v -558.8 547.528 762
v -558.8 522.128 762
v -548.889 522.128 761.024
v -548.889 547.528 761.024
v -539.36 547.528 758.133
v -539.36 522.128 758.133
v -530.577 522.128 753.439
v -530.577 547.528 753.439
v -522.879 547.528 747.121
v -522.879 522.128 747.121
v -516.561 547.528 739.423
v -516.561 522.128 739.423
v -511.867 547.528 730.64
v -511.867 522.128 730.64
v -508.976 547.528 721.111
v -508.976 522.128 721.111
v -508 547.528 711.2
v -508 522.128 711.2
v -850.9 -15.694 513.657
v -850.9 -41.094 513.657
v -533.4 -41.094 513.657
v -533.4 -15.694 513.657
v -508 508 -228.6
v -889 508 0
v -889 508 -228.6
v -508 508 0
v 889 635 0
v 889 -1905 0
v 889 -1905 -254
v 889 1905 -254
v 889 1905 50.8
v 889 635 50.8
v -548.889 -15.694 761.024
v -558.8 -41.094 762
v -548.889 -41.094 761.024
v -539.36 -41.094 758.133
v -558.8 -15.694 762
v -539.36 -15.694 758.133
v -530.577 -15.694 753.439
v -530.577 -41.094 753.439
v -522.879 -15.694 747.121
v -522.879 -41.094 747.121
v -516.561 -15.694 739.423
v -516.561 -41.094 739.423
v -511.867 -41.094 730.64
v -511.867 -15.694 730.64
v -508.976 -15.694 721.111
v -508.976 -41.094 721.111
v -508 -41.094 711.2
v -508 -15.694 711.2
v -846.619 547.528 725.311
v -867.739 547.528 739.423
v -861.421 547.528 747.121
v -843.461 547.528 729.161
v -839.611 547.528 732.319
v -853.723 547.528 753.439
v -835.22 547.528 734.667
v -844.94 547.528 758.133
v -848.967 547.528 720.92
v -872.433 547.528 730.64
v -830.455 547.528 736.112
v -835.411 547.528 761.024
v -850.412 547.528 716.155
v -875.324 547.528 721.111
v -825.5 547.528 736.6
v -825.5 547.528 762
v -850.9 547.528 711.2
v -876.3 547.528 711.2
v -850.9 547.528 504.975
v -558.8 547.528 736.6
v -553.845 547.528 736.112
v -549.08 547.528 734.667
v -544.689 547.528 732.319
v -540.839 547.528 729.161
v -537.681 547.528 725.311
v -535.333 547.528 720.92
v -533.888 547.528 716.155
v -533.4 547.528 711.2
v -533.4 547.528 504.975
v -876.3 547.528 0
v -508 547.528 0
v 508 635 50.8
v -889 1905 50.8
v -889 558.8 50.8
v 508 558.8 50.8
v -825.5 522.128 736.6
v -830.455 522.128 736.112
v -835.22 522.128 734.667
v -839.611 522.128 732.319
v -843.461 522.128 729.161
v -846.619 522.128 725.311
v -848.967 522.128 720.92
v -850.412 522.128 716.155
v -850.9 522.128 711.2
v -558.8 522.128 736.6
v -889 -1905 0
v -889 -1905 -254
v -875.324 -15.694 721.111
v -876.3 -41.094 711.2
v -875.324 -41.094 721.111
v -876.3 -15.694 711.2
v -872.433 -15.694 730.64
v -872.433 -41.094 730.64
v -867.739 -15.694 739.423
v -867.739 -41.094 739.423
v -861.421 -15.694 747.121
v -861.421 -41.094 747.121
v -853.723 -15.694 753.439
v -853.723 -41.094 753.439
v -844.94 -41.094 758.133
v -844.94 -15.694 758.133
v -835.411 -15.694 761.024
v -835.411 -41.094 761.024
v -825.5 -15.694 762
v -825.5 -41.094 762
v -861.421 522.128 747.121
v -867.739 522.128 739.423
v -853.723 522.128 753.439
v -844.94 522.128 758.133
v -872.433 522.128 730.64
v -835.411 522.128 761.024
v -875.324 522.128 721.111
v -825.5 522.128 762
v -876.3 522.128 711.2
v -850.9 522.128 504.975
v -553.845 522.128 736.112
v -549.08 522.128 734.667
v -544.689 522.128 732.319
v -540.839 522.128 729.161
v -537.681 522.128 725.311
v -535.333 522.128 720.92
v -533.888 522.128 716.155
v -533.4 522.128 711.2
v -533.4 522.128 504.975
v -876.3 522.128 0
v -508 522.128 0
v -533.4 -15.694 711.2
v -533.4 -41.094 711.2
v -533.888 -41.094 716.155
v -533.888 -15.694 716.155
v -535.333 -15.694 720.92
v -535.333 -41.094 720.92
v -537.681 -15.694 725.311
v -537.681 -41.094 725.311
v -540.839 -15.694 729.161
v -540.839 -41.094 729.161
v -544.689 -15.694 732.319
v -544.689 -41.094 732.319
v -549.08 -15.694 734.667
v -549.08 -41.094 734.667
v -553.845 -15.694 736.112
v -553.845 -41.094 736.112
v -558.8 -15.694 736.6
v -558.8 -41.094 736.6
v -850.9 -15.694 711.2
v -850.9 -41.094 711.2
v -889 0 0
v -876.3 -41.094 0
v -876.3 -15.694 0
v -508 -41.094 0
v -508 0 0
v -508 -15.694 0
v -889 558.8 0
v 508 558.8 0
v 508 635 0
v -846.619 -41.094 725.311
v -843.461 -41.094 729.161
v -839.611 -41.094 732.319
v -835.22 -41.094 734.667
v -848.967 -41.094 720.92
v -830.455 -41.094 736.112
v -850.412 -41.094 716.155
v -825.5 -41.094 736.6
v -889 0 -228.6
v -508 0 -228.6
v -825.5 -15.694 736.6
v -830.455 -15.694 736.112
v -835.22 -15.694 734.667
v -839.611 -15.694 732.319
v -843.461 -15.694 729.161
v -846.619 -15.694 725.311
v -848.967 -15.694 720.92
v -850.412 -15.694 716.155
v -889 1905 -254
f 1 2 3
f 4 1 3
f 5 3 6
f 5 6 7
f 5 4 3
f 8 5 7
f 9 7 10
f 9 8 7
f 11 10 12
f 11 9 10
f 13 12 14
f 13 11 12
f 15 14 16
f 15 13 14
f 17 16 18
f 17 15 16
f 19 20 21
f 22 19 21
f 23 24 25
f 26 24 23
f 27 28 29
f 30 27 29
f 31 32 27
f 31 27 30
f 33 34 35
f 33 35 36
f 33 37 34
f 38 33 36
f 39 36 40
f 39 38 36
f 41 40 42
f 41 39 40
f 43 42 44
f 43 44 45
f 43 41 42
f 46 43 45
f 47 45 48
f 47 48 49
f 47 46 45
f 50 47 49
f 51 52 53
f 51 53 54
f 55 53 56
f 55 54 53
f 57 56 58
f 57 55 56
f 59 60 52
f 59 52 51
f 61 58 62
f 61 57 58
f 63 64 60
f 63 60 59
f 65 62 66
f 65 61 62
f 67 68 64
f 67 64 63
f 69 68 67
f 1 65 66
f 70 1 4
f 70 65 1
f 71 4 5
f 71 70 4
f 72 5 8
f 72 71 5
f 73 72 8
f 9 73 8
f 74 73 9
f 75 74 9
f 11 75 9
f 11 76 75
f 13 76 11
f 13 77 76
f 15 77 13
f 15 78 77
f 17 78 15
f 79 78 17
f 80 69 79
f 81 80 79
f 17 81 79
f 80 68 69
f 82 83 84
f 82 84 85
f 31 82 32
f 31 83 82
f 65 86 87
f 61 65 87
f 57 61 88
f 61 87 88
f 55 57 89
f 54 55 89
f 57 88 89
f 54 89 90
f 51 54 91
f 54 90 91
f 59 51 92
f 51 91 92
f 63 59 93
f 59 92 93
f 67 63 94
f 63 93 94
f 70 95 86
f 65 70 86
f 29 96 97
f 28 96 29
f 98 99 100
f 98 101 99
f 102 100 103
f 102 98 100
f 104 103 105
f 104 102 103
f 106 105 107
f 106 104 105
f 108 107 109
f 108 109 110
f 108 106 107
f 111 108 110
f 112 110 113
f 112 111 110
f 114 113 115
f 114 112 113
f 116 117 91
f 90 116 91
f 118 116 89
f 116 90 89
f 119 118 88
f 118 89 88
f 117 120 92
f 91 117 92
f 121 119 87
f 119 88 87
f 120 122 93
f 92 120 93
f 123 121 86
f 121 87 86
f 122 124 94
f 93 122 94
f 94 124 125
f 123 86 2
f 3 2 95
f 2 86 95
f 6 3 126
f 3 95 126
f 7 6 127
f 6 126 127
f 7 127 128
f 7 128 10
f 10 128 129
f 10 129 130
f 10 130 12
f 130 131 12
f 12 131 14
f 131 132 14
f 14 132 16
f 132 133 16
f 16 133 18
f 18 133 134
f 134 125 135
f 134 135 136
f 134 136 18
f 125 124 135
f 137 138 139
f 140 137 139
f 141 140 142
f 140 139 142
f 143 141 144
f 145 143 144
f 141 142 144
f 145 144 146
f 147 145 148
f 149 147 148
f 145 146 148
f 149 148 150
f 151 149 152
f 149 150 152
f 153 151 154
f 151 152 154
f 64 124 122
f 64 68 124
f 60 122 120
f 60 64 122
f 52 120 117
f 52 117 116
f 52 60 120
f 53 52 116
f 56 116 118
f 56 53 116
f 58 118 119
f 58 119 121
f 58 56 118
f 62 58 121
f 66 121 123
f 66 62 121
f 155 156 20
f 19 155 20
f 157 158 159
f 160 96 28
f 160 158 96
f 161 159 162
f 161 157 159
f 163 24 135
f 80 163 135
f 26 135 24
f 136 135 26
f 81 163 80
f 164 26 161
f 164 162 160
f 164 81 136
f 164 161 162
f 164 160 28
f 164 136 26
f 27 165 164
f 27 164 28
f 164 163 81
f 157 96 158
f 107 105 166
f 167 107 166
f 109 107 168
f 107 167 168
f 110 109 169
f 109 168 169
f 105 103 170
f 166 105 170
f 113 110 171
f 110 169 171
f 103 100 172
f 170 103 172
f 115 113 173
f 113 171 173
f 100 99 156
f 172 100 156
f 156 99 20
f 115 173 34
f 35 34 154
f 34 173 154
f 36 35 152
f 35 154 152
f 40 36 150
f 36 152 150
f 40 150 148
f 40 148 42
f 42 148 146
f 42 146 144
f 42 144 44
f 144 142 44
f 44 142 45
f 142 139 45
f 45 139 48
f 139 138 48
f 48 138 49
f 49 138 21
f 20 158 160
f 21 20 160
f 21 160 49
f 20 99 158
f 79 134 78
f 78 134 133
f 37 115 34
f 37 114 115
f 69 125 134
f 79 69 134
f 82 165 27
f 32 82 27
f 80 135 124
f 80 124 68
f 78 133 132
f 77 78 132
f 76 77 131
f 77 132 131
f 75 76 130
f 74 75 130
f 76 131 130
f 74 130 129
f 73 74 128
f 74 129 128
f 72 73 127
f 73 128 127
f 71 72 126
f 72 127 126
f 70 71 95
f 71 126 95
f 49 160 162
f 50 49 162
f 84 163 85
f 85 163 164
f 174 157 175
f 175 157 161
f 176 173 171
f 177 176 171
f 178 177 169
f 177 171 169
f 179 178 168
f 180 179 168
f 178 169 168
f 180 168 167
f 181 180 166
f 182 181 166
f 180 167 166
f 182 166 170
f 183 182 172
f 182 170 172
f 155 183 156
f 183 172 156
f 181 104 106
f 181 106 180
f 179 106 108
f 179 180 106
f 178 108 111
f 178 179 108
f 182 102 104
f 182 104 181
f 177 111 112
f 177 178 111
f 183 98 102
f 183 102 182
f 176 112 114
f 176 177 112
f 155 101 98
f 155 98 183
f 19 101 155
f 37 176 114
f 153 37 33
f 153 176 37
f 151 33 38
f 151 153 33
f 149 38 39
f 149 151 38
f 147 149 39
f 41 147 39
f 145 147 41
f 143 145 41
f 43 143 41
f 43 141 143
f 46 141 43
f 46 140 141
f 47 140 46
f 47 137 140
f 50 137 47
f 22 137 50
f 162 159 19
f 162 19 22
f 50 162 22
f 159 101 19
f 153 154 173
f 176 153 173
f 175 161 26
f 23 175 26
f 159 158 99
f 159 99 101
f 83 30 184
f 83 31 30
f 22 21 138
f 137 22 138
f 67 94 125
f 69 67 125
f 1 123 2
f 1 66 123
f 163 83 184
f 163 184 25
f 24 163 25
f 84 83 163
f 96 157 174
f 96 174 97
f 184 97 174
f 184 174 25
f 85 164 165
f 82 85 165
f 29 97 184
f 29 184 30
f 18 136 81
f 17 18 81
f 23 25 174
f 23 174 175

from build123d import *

# Parameters (mm, degrees)
F1_DEPTH  = 50.8
F0_W      = 381
F0_H      = 609.6
F2_DEPTH  = 254
F3_W      = 381
F3_H      = 508
F4_DEPTH  = 228.6
F5_W      = 368.3
F5_H      = 25.4
F6_DEPTH  = 762
F7_R      = 50.8
F8_R      = 50.8
F10_DEPTH = 25.4
F11_W     = 368.3
F11_H     = 25.4
F12_DEPTH = 762
F13_R     = 50.8
F14_R     = 50.8
F16_DEPTH = 25.4


with BuildPart() as f1:
    # F0 (on Top) → F1 (new body)
    with BuildSketch(Plane.XY):
        Polygon((889, 1905), (-889, 1905), (-889, 558.8), (508, 558.8), (508, 635), (889, 635), align=None)
    extrude(amount=F1_DEPTH)

    # F0 (on Top) → F2 (join)
    with BuildSketch(Plane.XY):
        Polygon((889, 1905), (-889, 1905), (-889, 558.8), (508, 558.8), (508, 635), (889, 635), align=None)
        Polygon((508, 558.8), (-889, 558.8), (-889, 304.8), (-508, 304.8), (-508, -304.8), (-889, -304.8), (-889, -1905), (889, -1905), (889, 635), (508, 635), align=None)
        with Locations((-698.5, 0)):
            Rectangle(F0_W, F0_H)
    extrude(amount=-F2_DEPTH)

    # F3 (on face) → F4 (cut)
    with BuildSketch(Plane.XY):
        with Locations((-698.5, 254)):
            Rectangle(F3_W, F3_H)
    extrude(amount=-F4_DEPTH, mode=Mode.SUBTRACT)

    # F5 (on face) → F6 (join)
    with BuildSketch(Plane.XY):
        with Locations((-692.15, 534.827676)):
            Rectangle(F5_W, F5_H)
    extrude(amount=F6_DEPTH)

    # F7
    f7_edges = [f1.edges().sort_by_distance(p)[0] for p in [
        (-876.3, 534.827676, 762),
    ]]
    fillet(f7_edges, radius=F7_R)

    # F8
    f8_edges = [f1.edges().sort_by_distance(p)[0] for p in [
        (-508, 534.827676, 762),
    ]]
    fillet(f8_edges, radius=F8_R)

    # F9 (on face) → F10 (cut)
    with BuildSketch(Plane.XZ.offset(-522.127676)):
        with BuildLine():
            Line((-850.9, 711.2), (-850.9, 504.975423))
            Line((-850.9, 504.975423), (-533.4, 504.975423))
            Line((-533.4, 504.975423), (-533.4, 711.2))
            ThreePointArc((-533.4, 711.2), (-540.839488, 729.160512), (-558.8, 736.6))
            Line((-558.8, 736.6), (-825.5, 736.6))
            ThreePointArc((-825.5, 736.6), (-843.460512, 729.160512), (-850.9, 711.2))
        make_face()
    extrude(amount=-F10_DEPTH, mode=Mode.SUBTRACT)

    # F11 (on face) → F12 (join)
    with BuildSketch(Plane.XY):
        with Locations((-692.15, -28.393558)):
            Rectangle(F11_W, F11_H)
    extrude(amount=F12_DEPTH)

    # F13
    f13_edges = [f1.edges().sort_by_distance(p)[0] for p in [
        (-876.3, -28.393558, 762),
    ]]
    fillet(f13_edges, radius=F13_R)

    # F14
    f14_edges = [f1.edges().sort_by_distance(p)[0] for p in [
        (-508, -28.393558, 762),
    ]]
    fillet(f14_edges, radius=F14_R)

    # F15 (on face) → F16 (cut)
    with BuildSketch(Plane.XZ.offset(41.093558)):
        with BuildLine():
            Line((-850.9, 711.2), (-850.9, 513.656903))
            Line((-850.9, 513.656903), (-533.4, 513.656903))
            Line((-533.4, 513.656903), (-533.4, 711.2))
            ThreePointArc((-533.4, 711.2), (-540.839488, 729.160512), (-558.8, 736.6))
            Line((-558.8, 736.6), (-825.5, 736.6))
            ThreePointArc((-825.5, 736.6), (-843.460512, 729.160512), (-850.9, 711.2))
        make_face()
    extrude(amount=-F16_DEPTH, mode=Mode.SUBTRACT)


solid = f1.part
